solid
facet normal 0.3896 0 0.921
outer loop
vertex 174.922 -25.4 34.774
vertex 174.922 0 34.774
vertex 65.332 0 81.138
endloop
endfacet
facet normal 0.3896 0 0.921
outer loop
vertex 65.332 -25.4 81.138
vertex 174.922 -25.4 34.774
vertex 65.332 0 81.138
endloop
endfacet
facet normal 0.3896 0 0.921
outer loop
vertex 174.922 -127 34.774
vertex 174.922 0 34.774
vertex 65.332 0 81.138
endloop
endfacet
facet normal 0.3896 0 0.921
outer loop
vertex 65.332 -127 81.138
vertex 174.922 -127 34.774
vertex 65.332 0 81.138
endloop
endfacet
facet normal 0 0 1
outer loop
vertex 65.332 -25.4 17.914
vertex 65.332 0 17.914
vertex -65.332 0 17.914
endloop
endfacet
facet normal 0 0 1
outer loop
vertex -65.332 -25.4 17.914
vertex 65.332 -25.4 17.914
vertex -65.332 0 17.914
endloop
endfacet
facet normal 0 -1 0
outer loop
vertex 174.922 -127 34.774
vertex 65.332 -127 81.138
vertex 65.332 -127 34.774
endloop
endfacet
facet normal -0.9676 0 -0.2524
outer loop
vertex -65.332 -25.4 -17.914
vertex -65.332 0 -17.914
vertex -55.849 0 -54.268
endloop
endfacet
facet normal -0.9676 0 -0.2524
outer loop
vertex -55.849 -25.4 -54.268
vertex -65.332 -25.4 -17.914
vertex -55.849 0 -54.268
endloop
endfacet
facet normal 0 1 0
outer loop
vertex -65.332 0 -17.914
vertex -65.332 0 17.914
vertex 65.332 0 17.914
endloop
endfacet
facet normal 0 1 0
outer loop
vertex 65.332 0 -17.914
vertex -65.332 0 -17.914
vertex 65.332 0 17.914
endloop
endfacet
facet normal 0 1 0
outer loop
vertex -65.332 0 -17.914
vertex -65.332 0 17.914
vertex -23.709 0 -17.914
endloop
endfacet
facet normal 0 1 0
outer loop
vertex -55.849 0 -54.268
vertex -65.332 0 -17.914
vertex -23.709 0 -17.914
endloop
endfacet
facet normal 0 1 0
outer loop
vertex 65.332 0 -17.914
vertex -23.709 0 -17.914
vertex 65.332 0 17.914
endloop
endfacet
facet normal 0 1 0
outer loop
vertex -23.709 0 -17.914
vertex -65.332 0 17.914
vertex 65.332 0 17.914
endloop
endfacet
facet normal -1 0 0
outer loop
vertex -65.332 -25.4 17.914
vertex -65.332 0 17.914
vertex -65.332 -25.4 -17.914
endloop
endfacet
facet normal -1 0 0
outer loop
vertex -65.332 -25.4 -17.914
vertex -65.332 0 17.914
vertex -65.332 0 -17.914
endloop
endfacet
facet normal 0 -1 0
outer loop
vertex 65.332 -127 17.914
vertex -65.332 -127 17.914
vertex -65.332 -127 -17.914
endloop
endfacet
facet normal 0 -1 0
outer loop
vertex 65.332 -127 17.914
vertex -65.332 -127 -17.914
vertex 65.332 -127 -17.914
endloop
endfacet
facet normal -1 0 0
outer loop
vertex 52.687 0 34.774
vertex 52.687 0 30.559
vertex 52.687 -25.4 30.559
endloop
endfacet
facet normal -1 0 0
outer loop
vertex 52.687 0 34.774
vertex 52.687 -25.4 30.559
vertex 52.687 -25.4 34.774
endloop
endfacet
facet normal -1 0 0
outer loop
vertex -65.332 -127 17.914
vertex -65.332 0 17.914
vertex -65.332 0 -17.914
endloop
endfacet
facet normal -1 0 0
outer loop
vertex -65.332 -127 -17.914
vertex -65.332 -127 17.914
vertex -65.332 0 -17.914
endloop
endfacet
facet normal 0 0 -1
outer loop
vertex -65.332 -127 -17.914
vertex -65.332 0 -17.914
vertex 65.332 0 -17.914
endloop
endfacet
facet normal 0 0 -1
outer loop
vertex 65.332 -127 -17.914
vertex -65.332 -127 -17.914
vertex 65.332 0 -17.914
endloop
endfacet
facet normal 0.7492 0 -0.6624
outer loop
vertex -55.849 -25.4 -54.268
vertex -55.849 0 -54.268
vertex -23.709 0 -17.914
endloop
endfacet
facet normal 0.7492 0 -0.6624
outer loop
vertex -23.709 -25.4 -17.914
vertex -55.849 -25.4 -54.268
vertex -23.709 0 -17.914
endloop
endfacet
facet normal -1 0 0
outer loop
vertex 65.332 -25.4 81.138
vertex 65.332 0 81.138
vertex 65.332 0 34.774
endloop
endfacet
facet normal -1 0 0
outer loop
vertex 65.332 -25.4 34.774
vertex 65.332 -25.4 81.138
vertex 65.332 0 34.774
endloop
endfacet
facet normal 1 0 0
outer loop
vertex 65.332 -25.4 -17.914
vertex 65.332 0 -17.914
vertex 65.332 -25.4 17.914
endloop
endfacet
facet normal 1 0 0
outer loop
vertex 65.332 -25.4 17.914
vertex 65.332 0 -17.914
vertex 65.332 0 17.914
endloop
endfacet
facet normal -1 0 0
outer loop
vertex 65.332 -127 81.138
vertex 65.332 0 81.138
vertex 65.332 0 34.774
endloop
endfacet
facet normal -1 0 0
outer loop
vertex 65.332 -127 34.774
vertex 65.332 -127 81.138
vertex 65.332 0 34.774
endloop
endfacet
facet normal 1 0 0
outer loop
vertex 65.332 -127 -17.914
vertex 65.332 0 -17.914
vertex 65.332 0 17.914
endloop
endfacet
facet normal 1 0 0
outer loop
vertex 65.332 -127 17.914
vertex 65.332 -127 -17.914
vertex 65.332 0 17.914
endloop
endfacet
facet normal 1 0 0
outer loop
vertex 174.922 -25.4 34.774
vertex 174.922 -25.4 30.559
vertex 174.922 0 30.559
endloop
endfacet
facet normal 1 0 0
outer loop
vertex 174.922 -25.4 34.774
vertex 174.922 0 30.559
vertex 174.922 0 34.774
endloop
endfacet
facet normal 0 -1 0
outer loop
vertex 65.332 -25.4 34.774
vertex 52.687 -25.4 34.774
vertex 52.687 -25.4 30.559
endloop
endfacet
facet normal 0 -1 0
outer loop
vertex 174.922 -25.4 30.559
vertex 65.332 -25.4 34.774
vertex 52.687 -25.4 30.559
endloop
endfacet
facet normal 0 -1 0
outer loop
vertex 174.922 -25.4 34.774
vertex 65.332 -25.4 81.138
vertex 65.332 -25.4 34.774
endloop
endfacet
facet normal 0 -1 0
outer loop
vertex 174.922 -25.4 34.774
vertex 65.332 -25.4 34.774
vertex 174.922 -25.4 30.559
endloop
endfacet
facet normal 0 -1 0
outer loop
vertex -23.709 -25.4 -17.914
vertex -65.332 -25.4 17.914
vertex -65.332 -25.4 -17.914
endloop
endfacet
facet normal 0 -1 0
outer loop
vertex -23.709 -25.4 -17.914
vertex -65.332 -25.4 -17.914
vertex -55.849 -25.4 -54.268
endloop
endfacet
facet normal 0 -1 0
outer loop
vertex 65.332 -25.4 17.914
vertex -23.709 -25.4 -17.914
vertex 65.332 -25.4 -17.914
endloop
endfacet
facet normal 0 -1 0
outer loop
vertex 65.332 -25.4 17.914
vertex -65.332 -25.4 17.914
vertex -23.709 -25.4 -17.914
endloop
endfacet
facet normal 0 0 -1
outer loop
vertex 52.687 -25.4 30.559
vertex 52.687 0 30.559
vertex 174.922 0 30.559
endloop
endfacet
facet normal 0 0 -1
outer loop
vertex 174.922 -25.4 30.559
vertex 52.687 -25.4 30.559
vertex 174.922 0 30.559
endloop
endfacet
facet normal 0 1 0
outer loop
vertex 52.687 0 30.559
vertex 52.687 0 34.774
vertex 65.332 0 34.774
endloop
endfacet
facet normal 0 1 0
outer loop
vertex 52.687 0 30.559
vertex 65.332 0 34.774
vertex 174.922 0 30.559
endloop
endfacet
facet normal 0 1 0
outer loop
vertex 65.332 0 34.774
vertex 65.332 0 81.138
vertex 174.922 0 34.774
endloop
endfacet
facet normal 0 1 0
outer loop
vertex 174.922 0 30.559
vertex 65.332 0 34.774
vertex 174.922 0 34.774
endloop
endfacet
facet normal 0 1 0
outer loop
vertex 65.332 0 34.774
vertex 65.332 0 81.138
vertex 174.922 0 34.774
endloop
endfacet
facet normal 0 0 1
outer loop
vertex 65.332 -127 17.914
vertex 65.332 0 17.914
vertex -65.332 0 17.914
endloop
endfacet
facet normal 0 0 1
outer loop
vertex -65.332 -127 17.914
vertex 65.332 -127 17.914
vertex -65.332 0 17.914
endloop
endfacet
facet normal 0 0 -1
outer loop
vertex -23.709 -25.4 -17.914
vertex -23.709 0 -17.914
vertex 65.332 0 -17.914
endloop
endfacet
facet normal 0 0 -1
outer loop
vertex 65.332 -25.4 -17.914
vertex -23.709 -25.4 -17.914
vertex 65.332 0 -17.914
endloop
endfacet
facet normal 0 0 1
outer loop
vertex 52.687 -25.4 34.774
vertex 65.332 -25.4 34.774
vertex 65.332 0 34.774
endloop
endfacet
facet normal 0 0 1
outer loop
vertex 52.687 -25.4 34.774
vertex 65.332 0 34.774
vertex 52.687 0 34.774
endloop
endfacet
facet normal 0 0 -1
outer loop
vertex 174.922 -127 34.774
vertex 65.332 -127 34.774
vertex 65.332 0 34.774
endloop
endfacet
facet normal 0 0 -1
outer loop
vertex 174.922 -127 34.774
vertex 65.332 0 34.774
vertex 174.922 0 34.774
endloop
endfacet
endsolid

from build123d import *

# Parameters (mm, degrees)
F1_DEPTH = 127
F2_DEPTH = 25.4
F0_W     = 12.6449428499
F0_H     = 4.2149834335
F0_W_2   = 109.5895729959


with BuildPart() as f1:
    # F0 (on Front) → F1 (new body)
    with BuildSketch(Plane.XZ):
        Polygon((-65.3322413564, 17.913678661), (-65.3322413564, -17.913678661), (-23.7092748284, -17.913678661), (65.3322413564, -17.913678661), (65.3322413564, 17.913678661), align=None)
    extrude(amount=F1_DEPTH)


with BuildPart() as f1b:
    # F0 (on Front) → F1, piece 2 (new body)
    with BuildSketch(Plane.XZ):
        Polygon((65.3322413564, 76.3965770602), (65.3322413564, 34.7736161202), (174.9218143523, 34.7736161202), (65.3322413564, 81.1384320259), align=None)
    extrude(amount=F1_DEPTH)


with BuildPart() as f2:
    # F0 (on Front) → F2 (new body)
    with BuildSketch(Plane.XZ):
        Polygon((-65.3322413564, 17.913678661), (-65.3322413564, -17.913678661), (-23.7092748284, -17.913678661), (65.3322413564, -17.913678661), (65.3322413564, 17.913678661), align=None)
        Polygon((-23.7092748284, -17.913678661), (-65.3322413564, -17.913678661), (-55.8485276997, -54.2679131031), align=None)
    extrude(amount=F2_DEPTH)


with BuildPart() as f2b:
    # F0 (on Front) → F2, piece 2 (new body)
    with BuildSketch(Plane.XZ):
        with Locations((59.0097699314, 32.6661244035)):
            Rectangle(F0_W, F0_H)
        with Locations((120.1270278543, 32.6661244035)):
            Rectangle(F0_W_2, F0_H)
        Polygon((65.3322413564, 76.3965770602), (65.3322413564, 34.7736161202), (174.9218143523, 34.7736161202), (65.3322413564, 81.1384320259), align=None)
    extrude(amount=F2_DEPTH)


solid = Compound([f1.part, f1b.part, f2.part, f2b.part])
